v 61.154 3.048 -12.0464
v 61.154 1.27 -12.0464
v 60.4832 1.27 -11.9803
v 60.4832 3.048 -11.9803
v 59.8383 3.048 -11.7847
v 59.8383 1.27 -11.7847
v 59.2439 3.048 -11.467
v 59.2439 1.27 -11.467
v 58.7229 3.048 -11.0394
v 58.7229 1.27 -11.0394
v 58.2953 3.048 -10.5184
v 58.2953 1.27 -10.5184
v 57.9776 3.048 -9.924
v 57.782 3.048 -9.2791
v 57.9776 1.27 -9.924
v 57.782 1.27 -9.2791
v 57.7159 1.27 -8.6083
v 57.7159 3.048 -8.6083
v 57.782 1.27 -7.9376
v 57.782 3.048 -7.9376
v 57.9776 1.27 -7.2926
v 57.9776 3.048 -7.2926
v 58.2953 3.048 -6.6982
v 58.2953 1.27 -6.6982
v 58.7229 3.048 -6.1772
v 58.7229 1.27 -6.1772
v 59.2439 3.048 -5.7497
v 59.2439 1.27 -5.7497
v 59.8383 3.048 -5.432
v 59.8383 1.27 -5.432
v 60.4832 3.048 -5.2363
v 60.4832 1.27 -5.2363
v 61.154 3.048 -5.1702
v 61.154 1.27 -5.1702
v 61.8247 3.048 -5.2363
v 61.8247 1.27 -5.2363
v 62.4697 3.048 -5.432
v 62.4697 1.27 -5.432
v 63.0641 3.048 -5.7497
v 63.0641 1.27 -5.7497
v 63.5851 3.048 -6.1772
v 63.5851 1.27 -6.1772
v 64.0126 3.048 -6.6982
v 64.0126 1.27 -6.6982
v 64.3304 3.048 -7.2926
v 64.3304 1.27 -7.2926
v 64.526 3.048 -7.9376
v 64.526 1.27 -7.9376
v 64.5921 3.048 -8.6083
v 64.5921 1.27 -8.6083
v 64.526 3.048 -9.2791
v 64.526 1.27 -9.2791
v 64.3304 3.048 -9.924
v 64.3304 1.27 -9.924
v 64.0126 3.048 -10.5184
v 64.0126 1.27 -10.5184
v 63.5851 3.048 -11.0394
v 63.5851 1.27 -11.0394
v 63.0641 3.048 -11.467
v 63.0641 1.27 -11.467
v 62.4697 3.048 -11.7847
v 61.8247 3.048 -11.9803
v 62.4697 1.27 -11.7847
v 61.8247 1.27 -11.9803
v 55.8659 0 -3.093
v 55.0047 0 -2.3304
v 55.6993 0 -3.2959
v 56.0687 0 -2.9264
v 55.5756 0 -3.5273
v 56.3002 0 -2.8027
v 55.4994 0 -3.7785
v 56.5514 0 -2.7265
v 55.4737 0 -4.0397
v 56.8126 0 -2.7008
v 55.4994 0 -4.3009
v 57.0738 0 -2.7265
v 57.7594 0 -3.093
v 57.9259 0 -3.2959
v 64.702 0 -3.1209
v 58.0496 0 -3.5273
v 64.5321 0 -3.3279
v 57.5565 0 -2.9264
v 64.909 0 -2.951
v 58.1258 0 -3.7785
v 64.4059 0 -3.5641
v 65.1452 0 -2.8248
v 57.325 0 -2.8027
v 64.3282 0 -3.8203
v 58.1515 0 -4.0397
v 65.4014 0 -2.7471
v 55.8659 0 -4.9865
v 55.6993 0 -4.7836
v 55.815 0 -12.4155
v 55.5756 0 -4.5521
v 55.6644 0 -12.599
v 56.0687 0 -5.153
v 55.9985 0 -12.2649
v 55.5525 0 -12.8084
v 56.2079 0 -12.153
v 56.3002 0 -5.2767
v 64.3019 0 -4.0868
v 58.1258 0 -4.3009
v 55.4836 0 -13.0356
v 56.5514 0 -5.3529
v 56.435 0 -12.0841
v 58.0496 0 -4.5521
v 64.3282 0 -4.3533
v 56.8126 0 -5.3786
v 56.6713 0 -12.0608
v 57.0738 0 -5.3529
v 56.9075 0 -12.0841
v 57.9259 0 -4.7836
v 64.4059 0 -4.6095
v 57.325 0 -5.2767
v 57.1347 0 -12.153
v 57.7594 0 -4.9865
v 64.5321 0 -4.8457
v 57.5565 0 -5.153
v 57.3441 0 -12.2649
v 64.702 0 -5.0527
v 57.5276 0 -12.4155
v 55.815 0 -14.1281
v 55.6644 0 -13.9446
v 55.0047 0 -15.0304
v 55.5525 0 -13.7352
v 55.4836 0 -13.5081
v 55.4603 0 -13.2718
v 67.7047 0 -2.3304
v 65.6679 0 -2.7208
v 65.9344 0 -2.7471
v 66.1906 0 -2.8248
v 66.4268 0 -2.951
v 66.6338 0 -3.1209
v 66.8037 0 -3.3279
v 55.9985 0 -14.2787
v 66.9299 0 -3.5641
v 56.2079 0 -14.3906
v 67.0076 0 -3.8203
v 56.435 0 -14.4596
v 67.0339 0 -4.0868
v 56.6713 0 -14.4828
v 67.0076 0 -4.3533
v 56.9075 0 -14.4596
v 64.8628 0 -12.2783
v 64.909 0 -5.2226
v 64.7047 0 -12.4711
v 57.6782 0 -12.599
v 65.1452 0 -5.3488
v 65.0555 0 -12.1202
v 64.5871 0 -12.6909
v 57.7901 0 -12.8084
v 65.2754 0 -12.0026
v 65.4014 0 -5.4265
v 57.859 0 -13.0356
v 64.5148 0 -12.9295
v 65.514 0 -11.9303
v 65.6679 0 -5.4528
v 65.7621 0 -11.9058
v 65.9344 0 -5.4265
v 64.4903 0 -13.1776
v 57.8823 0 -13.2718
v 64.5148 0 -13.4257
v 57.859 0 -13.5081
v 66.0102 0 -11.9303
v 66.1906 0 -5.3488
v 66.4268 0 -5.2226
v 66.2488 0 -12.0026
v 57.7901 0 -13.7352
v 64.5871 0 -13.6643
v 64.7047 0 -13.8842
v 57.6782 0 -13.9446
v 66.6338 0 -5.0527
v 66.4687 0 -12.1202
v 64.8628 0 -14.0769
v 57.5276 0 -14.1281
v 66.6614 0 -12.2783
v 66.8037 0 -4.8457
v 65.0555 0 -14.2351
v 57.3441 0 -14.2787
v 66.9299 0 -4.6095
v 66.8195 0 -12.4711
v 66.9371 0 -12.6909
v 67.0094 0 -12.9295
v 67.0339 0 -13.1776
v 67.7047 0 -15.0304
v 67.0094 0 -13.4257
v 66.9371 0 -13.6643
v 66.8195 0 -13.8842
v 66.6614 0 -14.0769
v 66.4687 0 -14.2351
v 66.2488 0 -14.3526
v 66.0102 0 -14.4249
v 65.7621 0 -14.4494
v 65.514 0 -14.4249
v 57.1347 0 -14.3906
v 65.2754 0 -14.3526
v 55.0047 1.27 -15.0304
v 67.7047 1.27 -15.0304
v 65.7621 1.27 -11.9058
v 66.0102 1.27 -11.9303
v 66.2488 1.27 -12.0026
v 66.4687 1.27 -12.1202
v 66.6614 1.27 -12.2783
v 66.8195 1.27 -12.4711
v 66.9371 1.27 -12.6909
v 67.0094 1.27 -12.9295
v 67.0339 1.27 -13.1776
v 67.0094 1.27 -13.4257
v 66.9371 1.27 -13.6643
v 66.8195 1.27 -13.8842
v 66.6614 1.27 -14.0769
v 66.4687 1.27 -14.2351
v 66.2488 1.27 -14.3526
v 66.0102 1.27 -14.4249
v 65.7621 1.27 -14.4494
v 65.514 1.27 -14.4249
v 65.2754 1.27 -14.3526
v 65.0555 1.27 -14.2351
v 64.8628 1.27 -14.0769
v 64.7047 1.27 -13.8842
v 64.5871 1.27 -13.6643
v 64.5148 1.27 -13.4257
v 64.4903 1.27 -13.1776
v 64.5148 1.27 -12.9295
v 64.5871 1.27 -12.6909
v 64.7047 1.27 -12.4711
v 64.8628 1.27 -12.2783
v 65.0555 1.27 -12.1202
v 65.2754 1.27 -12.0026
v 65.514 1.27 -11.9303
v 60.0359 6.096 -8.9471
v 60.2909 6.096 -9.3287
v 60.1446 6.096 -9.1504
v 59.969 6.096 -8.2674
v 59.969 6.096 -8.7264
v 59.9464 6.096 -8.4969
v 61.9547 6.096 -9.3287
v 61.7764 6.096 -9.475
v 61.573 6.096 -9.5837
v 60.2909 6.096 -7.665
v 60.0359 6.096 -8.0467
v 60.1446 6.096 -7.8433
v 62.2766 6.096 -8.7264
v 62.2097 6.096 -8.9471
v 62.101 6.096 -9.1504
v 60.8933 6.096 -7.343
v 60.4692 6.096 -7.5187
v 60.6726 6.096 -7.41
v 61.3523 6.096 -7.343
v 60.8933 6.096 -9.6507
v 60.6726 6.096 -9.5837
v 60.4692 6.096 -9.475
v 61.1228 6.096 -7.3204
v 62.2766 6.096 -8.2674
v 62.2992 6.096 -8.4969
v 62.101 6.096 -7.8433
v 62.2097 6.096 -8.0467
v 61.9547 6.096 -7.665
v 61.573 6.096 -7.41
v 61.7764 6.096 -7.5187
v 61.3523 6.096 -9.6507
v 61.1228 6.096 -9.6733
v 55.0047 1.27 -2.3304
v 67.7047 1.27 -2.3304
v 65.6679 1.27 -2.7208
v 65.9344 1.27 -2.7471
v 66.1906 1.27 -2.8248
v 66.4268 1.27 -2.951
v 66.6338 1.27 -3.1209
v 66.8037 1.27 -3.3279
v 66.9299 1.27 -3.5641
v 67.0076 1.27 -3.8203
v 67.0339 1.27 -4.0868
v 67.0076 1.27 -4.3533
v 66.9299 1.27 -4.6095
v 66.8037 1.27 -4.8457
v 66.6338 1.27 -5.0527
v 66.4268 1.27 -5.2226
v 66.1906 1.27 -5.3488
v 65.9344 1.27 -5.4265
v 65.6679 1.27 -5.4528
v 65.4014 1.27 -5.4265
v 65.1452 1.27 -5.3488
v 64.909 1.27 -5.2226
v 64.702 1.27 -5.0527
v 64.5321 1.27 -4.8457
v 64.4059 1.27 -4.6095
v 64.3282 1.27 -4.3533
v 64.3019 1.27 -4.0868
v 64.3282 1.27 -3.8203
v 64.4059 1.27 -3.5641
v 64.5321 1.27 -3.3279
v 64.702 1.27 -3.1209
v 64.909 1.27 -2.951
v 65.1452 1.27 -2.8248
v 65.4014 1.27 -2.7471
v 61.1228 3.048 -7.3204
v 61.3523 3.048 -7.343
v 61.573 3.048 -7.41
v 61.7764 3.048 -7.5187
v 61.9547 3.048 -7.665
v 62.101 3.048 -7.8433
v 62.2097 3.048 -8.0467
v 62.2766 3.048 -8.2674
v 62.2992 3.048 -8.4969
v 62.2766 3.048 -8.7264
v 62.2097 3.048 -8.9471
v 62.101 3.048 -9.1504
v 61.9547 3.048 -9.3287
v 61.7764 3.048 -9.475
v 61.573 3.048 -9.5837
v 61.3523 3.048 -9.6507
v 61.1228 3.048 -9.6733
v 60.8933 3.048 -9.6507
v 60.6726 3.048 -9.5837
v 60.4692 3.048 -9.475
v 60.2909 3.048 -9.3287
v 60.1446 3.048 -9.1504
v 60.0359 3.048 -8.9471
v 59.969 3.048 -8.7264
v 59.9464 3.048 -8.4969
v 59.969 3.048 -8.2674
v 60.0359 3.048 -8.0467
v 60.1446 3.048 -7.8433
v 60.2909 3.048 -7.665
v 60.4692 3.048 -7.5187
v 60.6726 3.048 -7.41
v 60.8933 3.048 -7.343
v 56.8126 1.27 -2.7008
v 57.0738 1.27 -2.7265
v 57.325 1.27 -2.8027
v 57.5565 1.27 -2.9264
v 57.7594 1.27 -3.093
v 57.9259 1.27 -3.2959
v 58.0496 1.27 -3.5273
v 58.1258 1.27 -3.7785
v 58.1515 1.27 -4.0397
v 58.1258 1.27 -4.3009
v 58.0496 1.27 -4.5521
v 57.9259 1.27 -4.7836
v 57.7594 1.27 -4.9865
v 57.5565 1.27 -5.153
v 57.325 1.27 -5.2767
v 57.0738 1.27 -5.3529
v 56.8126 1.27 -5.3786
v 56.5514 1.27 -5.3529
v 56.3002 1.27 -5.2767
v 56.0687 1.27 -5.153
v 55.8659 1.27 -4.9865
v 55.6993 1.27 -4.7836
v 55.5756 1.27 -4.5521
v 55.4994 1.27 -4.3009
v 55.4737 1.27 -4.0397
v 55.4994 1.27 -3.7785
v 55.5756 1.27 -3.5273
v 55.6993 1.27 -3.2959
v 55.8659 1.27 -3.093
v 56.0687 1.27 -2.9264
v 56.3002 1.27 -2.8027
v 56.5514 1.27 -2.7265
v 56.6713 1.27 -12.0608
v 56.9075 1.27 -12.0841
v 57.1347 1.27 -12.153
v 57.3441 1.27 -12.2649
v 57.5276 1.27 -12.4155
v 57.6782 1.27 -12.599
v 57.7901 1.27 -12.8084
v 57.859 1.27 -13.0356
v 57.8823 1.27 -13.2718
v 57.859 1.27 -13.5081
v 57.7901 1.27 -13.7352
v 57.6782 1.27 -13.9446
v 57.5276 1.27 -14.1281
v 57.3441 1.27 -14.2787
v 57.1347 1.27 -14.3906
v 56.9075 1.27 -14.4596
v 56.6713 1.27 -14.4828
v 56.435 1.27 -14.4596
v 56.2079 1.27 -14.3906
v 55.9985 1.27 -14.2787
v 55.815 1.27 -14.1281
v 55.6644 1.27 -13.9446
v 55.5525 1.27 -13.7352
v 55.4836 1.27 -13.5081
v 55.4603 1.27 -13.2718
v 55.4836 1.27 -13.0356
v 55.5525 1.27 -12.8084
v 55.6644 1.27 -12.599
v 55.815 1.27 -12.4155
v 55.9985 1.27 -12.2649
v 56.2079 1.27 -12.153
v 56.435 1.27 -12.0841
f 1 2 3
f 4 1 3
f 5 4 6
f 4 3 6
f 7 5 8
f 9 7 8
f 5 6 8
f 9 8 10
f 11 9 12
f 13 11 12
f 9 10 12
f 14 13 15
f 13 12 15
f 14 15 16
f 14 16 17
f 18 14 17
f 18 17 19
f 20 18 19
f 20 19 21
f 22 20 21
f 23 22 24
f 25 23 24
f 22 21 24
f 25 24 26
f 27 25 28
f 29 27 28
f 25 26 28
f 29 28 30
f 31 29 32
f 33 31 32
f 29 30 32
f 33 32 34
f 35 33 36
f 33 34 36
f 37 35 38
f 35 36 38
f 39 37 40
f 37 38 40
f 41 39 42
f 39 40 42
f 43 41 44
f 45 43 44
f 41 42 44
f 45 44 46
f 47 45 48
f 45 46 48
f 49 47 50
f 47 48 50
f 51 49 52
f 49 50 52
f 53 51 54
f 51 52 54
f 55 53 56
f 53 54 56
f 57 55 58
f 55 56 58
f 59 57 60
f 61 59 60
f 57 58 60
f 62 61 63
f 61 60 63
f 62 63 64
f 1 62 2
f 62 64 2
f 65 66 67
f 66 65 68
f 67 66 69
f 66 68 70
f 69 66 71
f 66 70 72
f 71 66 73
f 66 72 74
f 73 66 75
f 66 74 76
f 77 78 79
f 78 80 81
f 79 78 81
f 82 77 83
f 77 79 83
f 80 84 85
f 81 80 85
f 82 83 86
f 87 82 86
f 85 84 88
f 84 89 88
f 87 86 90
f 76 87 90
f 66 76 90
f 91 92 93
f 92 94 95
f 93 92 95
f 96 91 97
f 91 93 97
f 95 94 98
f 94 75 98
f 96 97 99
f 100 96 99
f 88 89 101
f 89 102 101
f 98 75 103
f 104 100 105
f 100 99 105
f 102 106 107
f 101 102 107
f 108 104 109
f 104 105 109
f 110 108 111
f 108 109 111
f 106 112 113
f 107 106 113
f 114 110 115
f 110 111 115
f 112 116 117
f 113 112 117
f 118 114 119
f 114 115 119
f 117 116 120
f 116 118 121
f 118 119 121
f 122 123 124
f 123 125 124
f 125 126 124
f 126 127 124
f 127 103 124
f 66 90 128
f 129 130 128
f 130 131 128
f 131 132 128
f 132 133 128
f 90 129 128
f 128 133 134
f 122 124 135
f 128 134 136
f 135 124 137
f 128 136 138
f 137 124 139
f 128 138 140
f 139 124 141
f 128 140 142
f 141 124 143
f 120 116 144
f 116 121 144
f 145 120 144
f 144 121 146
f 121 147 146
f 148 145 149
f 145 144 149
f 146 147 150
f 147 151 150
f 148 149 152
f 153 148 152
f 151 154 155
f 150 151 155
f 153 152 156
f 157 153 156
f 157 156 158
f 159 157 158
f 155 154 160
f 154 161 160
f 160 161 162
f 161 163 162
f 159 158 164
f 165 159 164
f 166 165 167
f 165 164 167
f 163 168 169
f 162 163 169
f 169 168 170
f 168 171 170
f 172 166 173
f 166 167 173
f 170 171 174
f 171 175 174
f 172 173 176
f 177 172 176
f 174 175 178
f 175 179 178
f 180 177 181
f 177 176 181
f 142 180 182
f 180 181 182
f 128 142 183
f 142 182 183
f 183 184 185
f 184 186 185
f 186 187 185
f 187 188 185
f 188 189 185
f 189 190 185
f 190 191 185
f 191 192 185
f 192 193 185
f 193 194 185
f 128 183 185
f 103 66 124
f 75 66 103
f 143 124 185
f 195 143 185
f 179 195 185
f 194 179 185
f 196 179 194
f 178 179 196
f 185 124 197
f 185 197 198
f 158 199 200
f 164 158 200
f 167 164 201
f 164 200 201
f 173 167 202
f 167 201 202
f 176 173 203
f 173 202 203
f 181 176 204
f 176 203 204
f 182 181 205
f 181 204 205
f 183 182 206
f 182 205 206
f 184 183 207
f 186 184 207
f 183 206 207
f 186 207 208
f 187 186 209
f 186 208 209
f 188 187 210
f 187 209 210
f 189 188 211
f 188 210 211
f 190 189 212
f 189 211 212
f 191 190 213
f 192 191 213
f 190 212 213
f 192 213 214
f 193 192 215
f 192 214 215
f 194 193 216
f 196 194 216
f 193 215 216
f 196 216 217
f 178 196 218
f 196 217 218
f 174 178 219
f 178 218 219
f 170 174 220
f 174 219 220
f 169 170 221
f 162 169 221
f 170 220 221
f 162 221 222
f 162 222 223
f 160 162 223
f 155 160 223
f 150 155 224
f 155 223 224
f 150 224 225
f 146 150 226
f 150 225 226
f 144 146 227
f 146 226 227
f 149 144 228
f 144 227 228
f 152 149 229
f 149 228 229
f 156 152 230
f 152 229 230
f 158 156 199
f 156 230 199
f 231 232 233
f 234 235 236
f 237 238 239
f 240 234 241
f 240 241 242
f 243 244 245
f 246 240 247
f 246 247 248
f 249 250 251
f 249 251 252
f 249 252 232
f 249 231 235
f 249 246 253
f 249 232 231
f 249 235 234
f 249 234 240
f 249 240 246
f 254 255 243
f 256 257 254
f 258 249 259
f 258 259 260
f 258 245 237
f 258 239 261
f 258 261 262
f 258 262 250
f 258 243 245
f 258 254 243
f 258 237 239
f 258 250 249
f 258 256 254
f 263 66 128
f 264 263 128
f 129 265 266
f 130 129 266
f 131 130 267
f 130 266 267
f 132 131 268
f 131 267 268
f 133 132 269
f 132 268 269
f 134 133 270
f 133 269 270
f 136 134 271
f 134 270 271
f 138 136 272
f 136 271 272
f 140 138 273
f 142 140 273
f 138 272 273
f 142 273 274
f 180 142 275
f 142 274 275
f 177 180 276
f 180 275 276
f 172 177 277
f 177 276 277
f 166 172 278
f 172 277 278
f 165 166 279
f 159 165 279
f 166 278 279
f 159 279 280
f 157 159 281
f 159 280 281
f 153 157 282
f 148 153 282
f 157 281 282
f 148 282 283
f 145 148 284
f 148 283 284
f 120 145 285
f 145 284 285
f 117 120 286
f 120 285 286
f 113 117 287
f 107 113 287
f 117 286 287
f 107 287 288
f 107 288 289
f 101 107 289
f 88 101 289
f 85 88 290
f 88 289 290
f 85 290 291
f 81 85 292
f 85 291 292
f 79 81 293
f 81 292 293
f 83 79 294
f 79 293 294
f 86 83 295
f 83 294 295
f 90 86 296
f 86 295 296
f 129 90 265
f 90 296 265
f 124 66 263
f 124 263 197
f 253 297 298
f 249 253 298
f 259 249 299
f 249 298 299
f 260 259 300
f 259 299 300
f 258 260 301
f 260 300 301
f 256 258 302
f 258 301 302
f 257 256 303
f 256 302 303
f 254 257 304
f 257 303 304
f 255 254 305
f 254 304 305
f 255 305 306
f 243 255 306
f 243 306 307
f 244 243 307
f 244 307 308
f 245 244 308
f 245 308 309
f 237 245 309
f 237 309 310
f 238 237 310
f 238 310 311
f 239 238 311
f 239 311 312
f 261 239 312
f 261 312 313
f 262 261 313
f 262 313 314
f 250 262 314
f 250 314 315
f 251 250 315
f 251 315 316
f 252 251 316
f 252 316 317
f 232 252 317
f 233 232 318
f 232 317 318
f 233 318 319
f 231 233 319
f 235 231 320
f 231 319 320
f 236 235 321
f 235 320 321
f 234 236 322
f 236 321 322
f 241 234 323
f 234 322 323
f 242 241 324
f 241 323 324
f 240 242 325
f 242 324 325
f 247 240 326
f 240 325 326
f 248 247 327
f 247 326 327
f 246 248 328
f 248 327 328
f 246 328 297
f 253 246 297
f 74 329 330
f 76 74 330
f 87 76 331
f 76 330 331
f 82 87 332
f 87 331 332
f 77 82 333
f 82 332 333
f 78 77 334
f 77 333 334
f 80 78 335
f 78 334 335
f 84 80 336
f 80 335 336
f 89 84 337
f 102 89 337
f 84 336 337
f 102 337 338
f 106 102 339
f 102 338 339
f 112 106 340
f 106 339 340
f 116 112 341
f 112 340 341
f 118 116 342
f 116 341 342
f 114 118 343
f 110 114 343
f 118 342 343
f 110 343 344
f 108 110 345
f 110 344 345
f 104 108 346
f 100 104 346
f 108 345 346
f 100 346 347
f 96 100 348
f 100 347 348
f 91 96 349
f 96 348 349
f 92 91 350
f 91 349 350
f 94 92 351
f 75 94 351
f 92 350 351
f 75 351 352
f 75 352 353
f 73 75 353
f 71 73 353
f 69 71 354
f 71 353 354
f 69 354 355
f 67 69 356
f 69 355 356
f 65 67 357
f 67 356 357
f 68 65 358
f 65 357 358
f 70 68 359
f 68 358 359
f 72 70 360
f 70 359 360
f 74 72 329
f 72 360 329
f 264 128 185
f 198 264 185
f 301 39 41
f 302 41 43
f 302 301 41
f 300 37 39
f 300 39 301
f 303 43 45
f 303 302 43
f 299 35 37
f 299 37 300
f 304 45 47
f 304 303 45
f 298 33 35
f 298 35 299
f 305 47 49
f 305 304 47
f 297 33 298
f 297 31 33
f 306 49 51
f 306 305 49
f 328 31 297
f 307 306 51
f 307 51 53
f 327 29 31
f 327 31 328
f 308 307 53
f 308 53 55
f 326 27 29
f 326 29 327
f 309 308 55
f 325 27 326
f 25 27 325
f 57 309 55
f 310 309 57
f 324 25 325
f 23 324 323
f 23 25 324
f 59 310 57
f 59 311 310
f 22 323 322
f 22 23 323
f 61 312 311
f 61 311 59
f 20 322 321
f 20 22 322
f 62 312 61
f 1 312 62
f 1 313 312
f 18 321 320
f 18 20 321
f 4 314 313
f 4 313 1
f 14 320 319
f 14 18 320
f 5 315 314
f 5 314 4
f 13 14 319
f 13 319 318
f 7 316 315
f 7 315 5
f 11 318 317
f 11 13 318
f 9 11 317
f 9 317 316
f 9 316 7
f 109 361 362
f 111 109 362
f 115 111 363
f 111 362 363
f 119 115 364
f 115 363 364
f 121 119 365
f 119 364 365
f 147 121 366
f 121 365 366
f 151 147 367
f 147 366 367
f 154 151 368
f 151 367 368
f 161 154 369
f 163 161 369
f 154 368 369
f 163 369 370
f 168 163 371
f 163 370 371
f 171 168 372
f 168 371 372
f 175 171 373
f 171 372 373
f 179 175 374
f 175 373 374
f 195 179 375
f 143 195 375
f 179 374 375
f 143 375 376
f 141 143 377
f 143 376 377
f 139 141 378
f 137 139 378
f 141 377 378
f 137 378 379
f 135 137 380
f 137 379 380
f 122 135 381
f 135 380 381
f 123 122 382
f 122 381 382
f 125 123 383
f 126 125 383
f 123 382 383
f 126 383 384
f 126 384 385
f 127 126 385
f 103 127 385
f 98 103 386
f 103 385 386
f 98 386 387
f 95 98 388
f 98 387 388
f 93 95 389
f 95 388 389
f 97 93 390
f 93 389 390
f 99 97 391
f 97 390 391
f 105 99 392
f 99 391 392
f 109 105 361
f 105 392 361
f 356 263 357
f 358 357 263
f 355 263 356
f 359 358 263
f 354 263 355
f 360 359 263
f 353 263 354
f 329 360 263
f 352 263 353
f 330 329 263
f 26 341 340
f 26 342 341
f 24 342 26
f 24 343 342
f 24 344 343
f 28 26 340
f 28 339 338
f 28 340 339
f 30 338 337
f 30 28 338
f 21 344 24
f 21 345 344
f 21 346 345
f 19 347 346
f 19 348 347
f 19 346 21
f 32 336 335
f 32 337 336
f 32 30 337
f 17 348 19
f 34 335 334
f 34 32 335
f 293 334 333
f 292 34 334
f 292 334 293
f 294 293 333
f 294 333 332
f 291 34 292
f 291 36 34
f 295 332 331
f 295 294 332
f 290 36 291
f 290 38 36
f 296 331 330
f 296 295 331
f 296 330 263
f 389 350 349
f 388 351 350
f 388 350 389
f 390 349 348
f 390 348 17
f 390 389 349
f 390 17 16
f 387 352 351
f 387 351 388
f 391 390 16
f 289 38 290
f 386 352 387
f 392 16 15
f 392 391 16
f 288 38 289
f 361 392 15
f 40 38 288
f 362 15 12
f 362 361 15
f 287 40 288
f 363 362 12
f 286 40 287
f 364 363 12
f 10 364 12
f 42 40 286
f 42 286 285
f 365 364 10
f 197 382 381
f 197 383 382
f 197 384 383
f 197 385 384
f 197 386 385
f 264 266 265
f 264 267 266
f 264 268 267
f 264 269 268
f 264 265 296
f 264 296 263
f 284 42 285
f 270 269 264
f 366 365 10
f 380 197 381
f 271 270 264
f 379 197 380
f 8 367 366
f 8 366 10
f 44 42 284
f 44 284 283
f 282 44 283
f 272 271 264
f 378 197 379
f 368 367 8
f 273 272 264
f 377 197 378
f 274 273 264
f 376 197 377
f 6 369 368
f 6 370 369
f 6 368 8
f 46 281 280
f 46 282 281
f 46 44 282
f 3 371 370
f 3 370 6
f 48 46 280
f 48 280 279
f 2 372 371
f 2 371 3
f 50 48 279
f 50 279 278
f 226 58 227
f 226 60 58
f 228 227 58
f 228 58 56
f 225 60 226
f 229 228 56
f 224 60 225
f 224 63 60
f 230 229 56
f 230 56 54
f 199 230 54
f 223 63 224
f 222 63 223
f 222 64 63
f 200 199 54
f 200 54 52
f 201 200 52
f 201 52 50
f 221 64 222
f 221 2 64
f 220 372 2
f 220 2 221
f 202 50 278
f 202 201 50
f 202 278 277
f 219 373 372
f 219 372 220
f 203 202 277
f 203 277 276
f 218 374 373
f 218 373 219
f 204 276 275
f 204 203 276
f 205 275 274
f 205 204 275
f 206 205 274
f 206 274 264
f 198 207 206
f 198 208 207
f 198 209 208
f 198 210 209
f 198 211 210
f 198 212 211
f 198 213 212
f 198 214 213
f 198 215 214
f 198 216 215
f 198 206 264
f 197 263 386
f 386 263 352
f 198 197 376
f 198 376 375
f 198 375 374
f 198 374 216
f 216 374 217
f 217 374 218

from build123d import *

# Parameters (mm, degrees)
SKETCH1_W                = 12.7
SKETCH1_H                = 12.7
BOSS_EXTRUDE1_DEPTH      = 1.27
SKETCH2_R                = 1.211003997
SKETCH2_R_2              = 1.271770102
SKETCH2_R_3              = 1.338907355
SKETCH2_R_4              = 1.365975295
CUT_EXTRUDE1_DEPTH       = 1.27
SKETCH3_R                = 3.438076728
BOSS_EXTRUDE2_DEPTH      = 1.778
BOSS_EXTRUDE3_DEPTH      = 3.048
BOSS_EXTRUDE3_DEPTH_BACK = 2.54
SKETCH4_R                = 1.176424435


with BuildPart() as part:
    # Sketch1 → Boss-Extrude1 (new body)
    with BuildSketch(Plane(origin=(0, 0, 0), x_dir=(1, 0, 0), z_dir=(0, 1, 0))):
        with Locations((61.354700157, 8.680443435)):
            Rectangle(SKETCH1_W, SKETCH1_H)
    extrude(amount=BOSS_EXTRUDE1_DEPTH)

    # Sketch2 → Cut-Extrude1 (cut)
    with BuildSketch(Plane(origin=(0, 1.27, 0), x_dir=(1, 0, 0), z_dir=(0, 1, 0))):
        with Locations(Location((56.671293602, 13.271817518, 0), (0, 0, 270))):
            Circle(SKETCH2_R)
        with Locations(Location((65.762094704, 13.177612325, 0), (0, 0, 270))):
            Circle(SKETCH2_R_2)
        with Locations(Location((56.812601392, 4.039708628, 0), (0, 0, 270))):
            Circle(SKETCH2_R_3)
        with Locations(Location((65.667889511, 4.086811224, 0), (0, 0, 270))):
            Circle(SKETCH2_R_4)
    extrude(amount=-CUT_EXTRUDE1_DEPTH, mode=Mode.SUBTRACT)

    # Sketch3 → Boss-Extrude2 (add)
    with BuildSketch(Plane(origin=(0, 1.27, 0), x_dir=(1, 0, 0), z_dir=(0, 1, 0))):
        with Locations(Location((61.153985379, 8.608321241, 0), (0, 0, 90))):
            Circle(SKETCH3_R)
    extrude(amount=BOSS_EXTRUDE2_DEPTH)

    # Sketch4 → Boss-Extrude3 (add, two sides: drawn at the far end of the back side and taken through both)
    with BuildSketch(Plane(origin=(0, 3.048, 0), x_dir=(1, 0, 0), z_dir=(0, 1, 0)).offset(-BOSS_EXTRUDE3_DEPTH_BACK)):
        with Locations(Location((61.122804521, 8.49685939, 0), (0, 0, 270))):
            Circle(SKETCH4_R)
    extrude(amount=BOSS_EXTRUDE3_DEPTH + BOSS_EXTRUDE3_DEPTH_BACK)


solid = part.part
